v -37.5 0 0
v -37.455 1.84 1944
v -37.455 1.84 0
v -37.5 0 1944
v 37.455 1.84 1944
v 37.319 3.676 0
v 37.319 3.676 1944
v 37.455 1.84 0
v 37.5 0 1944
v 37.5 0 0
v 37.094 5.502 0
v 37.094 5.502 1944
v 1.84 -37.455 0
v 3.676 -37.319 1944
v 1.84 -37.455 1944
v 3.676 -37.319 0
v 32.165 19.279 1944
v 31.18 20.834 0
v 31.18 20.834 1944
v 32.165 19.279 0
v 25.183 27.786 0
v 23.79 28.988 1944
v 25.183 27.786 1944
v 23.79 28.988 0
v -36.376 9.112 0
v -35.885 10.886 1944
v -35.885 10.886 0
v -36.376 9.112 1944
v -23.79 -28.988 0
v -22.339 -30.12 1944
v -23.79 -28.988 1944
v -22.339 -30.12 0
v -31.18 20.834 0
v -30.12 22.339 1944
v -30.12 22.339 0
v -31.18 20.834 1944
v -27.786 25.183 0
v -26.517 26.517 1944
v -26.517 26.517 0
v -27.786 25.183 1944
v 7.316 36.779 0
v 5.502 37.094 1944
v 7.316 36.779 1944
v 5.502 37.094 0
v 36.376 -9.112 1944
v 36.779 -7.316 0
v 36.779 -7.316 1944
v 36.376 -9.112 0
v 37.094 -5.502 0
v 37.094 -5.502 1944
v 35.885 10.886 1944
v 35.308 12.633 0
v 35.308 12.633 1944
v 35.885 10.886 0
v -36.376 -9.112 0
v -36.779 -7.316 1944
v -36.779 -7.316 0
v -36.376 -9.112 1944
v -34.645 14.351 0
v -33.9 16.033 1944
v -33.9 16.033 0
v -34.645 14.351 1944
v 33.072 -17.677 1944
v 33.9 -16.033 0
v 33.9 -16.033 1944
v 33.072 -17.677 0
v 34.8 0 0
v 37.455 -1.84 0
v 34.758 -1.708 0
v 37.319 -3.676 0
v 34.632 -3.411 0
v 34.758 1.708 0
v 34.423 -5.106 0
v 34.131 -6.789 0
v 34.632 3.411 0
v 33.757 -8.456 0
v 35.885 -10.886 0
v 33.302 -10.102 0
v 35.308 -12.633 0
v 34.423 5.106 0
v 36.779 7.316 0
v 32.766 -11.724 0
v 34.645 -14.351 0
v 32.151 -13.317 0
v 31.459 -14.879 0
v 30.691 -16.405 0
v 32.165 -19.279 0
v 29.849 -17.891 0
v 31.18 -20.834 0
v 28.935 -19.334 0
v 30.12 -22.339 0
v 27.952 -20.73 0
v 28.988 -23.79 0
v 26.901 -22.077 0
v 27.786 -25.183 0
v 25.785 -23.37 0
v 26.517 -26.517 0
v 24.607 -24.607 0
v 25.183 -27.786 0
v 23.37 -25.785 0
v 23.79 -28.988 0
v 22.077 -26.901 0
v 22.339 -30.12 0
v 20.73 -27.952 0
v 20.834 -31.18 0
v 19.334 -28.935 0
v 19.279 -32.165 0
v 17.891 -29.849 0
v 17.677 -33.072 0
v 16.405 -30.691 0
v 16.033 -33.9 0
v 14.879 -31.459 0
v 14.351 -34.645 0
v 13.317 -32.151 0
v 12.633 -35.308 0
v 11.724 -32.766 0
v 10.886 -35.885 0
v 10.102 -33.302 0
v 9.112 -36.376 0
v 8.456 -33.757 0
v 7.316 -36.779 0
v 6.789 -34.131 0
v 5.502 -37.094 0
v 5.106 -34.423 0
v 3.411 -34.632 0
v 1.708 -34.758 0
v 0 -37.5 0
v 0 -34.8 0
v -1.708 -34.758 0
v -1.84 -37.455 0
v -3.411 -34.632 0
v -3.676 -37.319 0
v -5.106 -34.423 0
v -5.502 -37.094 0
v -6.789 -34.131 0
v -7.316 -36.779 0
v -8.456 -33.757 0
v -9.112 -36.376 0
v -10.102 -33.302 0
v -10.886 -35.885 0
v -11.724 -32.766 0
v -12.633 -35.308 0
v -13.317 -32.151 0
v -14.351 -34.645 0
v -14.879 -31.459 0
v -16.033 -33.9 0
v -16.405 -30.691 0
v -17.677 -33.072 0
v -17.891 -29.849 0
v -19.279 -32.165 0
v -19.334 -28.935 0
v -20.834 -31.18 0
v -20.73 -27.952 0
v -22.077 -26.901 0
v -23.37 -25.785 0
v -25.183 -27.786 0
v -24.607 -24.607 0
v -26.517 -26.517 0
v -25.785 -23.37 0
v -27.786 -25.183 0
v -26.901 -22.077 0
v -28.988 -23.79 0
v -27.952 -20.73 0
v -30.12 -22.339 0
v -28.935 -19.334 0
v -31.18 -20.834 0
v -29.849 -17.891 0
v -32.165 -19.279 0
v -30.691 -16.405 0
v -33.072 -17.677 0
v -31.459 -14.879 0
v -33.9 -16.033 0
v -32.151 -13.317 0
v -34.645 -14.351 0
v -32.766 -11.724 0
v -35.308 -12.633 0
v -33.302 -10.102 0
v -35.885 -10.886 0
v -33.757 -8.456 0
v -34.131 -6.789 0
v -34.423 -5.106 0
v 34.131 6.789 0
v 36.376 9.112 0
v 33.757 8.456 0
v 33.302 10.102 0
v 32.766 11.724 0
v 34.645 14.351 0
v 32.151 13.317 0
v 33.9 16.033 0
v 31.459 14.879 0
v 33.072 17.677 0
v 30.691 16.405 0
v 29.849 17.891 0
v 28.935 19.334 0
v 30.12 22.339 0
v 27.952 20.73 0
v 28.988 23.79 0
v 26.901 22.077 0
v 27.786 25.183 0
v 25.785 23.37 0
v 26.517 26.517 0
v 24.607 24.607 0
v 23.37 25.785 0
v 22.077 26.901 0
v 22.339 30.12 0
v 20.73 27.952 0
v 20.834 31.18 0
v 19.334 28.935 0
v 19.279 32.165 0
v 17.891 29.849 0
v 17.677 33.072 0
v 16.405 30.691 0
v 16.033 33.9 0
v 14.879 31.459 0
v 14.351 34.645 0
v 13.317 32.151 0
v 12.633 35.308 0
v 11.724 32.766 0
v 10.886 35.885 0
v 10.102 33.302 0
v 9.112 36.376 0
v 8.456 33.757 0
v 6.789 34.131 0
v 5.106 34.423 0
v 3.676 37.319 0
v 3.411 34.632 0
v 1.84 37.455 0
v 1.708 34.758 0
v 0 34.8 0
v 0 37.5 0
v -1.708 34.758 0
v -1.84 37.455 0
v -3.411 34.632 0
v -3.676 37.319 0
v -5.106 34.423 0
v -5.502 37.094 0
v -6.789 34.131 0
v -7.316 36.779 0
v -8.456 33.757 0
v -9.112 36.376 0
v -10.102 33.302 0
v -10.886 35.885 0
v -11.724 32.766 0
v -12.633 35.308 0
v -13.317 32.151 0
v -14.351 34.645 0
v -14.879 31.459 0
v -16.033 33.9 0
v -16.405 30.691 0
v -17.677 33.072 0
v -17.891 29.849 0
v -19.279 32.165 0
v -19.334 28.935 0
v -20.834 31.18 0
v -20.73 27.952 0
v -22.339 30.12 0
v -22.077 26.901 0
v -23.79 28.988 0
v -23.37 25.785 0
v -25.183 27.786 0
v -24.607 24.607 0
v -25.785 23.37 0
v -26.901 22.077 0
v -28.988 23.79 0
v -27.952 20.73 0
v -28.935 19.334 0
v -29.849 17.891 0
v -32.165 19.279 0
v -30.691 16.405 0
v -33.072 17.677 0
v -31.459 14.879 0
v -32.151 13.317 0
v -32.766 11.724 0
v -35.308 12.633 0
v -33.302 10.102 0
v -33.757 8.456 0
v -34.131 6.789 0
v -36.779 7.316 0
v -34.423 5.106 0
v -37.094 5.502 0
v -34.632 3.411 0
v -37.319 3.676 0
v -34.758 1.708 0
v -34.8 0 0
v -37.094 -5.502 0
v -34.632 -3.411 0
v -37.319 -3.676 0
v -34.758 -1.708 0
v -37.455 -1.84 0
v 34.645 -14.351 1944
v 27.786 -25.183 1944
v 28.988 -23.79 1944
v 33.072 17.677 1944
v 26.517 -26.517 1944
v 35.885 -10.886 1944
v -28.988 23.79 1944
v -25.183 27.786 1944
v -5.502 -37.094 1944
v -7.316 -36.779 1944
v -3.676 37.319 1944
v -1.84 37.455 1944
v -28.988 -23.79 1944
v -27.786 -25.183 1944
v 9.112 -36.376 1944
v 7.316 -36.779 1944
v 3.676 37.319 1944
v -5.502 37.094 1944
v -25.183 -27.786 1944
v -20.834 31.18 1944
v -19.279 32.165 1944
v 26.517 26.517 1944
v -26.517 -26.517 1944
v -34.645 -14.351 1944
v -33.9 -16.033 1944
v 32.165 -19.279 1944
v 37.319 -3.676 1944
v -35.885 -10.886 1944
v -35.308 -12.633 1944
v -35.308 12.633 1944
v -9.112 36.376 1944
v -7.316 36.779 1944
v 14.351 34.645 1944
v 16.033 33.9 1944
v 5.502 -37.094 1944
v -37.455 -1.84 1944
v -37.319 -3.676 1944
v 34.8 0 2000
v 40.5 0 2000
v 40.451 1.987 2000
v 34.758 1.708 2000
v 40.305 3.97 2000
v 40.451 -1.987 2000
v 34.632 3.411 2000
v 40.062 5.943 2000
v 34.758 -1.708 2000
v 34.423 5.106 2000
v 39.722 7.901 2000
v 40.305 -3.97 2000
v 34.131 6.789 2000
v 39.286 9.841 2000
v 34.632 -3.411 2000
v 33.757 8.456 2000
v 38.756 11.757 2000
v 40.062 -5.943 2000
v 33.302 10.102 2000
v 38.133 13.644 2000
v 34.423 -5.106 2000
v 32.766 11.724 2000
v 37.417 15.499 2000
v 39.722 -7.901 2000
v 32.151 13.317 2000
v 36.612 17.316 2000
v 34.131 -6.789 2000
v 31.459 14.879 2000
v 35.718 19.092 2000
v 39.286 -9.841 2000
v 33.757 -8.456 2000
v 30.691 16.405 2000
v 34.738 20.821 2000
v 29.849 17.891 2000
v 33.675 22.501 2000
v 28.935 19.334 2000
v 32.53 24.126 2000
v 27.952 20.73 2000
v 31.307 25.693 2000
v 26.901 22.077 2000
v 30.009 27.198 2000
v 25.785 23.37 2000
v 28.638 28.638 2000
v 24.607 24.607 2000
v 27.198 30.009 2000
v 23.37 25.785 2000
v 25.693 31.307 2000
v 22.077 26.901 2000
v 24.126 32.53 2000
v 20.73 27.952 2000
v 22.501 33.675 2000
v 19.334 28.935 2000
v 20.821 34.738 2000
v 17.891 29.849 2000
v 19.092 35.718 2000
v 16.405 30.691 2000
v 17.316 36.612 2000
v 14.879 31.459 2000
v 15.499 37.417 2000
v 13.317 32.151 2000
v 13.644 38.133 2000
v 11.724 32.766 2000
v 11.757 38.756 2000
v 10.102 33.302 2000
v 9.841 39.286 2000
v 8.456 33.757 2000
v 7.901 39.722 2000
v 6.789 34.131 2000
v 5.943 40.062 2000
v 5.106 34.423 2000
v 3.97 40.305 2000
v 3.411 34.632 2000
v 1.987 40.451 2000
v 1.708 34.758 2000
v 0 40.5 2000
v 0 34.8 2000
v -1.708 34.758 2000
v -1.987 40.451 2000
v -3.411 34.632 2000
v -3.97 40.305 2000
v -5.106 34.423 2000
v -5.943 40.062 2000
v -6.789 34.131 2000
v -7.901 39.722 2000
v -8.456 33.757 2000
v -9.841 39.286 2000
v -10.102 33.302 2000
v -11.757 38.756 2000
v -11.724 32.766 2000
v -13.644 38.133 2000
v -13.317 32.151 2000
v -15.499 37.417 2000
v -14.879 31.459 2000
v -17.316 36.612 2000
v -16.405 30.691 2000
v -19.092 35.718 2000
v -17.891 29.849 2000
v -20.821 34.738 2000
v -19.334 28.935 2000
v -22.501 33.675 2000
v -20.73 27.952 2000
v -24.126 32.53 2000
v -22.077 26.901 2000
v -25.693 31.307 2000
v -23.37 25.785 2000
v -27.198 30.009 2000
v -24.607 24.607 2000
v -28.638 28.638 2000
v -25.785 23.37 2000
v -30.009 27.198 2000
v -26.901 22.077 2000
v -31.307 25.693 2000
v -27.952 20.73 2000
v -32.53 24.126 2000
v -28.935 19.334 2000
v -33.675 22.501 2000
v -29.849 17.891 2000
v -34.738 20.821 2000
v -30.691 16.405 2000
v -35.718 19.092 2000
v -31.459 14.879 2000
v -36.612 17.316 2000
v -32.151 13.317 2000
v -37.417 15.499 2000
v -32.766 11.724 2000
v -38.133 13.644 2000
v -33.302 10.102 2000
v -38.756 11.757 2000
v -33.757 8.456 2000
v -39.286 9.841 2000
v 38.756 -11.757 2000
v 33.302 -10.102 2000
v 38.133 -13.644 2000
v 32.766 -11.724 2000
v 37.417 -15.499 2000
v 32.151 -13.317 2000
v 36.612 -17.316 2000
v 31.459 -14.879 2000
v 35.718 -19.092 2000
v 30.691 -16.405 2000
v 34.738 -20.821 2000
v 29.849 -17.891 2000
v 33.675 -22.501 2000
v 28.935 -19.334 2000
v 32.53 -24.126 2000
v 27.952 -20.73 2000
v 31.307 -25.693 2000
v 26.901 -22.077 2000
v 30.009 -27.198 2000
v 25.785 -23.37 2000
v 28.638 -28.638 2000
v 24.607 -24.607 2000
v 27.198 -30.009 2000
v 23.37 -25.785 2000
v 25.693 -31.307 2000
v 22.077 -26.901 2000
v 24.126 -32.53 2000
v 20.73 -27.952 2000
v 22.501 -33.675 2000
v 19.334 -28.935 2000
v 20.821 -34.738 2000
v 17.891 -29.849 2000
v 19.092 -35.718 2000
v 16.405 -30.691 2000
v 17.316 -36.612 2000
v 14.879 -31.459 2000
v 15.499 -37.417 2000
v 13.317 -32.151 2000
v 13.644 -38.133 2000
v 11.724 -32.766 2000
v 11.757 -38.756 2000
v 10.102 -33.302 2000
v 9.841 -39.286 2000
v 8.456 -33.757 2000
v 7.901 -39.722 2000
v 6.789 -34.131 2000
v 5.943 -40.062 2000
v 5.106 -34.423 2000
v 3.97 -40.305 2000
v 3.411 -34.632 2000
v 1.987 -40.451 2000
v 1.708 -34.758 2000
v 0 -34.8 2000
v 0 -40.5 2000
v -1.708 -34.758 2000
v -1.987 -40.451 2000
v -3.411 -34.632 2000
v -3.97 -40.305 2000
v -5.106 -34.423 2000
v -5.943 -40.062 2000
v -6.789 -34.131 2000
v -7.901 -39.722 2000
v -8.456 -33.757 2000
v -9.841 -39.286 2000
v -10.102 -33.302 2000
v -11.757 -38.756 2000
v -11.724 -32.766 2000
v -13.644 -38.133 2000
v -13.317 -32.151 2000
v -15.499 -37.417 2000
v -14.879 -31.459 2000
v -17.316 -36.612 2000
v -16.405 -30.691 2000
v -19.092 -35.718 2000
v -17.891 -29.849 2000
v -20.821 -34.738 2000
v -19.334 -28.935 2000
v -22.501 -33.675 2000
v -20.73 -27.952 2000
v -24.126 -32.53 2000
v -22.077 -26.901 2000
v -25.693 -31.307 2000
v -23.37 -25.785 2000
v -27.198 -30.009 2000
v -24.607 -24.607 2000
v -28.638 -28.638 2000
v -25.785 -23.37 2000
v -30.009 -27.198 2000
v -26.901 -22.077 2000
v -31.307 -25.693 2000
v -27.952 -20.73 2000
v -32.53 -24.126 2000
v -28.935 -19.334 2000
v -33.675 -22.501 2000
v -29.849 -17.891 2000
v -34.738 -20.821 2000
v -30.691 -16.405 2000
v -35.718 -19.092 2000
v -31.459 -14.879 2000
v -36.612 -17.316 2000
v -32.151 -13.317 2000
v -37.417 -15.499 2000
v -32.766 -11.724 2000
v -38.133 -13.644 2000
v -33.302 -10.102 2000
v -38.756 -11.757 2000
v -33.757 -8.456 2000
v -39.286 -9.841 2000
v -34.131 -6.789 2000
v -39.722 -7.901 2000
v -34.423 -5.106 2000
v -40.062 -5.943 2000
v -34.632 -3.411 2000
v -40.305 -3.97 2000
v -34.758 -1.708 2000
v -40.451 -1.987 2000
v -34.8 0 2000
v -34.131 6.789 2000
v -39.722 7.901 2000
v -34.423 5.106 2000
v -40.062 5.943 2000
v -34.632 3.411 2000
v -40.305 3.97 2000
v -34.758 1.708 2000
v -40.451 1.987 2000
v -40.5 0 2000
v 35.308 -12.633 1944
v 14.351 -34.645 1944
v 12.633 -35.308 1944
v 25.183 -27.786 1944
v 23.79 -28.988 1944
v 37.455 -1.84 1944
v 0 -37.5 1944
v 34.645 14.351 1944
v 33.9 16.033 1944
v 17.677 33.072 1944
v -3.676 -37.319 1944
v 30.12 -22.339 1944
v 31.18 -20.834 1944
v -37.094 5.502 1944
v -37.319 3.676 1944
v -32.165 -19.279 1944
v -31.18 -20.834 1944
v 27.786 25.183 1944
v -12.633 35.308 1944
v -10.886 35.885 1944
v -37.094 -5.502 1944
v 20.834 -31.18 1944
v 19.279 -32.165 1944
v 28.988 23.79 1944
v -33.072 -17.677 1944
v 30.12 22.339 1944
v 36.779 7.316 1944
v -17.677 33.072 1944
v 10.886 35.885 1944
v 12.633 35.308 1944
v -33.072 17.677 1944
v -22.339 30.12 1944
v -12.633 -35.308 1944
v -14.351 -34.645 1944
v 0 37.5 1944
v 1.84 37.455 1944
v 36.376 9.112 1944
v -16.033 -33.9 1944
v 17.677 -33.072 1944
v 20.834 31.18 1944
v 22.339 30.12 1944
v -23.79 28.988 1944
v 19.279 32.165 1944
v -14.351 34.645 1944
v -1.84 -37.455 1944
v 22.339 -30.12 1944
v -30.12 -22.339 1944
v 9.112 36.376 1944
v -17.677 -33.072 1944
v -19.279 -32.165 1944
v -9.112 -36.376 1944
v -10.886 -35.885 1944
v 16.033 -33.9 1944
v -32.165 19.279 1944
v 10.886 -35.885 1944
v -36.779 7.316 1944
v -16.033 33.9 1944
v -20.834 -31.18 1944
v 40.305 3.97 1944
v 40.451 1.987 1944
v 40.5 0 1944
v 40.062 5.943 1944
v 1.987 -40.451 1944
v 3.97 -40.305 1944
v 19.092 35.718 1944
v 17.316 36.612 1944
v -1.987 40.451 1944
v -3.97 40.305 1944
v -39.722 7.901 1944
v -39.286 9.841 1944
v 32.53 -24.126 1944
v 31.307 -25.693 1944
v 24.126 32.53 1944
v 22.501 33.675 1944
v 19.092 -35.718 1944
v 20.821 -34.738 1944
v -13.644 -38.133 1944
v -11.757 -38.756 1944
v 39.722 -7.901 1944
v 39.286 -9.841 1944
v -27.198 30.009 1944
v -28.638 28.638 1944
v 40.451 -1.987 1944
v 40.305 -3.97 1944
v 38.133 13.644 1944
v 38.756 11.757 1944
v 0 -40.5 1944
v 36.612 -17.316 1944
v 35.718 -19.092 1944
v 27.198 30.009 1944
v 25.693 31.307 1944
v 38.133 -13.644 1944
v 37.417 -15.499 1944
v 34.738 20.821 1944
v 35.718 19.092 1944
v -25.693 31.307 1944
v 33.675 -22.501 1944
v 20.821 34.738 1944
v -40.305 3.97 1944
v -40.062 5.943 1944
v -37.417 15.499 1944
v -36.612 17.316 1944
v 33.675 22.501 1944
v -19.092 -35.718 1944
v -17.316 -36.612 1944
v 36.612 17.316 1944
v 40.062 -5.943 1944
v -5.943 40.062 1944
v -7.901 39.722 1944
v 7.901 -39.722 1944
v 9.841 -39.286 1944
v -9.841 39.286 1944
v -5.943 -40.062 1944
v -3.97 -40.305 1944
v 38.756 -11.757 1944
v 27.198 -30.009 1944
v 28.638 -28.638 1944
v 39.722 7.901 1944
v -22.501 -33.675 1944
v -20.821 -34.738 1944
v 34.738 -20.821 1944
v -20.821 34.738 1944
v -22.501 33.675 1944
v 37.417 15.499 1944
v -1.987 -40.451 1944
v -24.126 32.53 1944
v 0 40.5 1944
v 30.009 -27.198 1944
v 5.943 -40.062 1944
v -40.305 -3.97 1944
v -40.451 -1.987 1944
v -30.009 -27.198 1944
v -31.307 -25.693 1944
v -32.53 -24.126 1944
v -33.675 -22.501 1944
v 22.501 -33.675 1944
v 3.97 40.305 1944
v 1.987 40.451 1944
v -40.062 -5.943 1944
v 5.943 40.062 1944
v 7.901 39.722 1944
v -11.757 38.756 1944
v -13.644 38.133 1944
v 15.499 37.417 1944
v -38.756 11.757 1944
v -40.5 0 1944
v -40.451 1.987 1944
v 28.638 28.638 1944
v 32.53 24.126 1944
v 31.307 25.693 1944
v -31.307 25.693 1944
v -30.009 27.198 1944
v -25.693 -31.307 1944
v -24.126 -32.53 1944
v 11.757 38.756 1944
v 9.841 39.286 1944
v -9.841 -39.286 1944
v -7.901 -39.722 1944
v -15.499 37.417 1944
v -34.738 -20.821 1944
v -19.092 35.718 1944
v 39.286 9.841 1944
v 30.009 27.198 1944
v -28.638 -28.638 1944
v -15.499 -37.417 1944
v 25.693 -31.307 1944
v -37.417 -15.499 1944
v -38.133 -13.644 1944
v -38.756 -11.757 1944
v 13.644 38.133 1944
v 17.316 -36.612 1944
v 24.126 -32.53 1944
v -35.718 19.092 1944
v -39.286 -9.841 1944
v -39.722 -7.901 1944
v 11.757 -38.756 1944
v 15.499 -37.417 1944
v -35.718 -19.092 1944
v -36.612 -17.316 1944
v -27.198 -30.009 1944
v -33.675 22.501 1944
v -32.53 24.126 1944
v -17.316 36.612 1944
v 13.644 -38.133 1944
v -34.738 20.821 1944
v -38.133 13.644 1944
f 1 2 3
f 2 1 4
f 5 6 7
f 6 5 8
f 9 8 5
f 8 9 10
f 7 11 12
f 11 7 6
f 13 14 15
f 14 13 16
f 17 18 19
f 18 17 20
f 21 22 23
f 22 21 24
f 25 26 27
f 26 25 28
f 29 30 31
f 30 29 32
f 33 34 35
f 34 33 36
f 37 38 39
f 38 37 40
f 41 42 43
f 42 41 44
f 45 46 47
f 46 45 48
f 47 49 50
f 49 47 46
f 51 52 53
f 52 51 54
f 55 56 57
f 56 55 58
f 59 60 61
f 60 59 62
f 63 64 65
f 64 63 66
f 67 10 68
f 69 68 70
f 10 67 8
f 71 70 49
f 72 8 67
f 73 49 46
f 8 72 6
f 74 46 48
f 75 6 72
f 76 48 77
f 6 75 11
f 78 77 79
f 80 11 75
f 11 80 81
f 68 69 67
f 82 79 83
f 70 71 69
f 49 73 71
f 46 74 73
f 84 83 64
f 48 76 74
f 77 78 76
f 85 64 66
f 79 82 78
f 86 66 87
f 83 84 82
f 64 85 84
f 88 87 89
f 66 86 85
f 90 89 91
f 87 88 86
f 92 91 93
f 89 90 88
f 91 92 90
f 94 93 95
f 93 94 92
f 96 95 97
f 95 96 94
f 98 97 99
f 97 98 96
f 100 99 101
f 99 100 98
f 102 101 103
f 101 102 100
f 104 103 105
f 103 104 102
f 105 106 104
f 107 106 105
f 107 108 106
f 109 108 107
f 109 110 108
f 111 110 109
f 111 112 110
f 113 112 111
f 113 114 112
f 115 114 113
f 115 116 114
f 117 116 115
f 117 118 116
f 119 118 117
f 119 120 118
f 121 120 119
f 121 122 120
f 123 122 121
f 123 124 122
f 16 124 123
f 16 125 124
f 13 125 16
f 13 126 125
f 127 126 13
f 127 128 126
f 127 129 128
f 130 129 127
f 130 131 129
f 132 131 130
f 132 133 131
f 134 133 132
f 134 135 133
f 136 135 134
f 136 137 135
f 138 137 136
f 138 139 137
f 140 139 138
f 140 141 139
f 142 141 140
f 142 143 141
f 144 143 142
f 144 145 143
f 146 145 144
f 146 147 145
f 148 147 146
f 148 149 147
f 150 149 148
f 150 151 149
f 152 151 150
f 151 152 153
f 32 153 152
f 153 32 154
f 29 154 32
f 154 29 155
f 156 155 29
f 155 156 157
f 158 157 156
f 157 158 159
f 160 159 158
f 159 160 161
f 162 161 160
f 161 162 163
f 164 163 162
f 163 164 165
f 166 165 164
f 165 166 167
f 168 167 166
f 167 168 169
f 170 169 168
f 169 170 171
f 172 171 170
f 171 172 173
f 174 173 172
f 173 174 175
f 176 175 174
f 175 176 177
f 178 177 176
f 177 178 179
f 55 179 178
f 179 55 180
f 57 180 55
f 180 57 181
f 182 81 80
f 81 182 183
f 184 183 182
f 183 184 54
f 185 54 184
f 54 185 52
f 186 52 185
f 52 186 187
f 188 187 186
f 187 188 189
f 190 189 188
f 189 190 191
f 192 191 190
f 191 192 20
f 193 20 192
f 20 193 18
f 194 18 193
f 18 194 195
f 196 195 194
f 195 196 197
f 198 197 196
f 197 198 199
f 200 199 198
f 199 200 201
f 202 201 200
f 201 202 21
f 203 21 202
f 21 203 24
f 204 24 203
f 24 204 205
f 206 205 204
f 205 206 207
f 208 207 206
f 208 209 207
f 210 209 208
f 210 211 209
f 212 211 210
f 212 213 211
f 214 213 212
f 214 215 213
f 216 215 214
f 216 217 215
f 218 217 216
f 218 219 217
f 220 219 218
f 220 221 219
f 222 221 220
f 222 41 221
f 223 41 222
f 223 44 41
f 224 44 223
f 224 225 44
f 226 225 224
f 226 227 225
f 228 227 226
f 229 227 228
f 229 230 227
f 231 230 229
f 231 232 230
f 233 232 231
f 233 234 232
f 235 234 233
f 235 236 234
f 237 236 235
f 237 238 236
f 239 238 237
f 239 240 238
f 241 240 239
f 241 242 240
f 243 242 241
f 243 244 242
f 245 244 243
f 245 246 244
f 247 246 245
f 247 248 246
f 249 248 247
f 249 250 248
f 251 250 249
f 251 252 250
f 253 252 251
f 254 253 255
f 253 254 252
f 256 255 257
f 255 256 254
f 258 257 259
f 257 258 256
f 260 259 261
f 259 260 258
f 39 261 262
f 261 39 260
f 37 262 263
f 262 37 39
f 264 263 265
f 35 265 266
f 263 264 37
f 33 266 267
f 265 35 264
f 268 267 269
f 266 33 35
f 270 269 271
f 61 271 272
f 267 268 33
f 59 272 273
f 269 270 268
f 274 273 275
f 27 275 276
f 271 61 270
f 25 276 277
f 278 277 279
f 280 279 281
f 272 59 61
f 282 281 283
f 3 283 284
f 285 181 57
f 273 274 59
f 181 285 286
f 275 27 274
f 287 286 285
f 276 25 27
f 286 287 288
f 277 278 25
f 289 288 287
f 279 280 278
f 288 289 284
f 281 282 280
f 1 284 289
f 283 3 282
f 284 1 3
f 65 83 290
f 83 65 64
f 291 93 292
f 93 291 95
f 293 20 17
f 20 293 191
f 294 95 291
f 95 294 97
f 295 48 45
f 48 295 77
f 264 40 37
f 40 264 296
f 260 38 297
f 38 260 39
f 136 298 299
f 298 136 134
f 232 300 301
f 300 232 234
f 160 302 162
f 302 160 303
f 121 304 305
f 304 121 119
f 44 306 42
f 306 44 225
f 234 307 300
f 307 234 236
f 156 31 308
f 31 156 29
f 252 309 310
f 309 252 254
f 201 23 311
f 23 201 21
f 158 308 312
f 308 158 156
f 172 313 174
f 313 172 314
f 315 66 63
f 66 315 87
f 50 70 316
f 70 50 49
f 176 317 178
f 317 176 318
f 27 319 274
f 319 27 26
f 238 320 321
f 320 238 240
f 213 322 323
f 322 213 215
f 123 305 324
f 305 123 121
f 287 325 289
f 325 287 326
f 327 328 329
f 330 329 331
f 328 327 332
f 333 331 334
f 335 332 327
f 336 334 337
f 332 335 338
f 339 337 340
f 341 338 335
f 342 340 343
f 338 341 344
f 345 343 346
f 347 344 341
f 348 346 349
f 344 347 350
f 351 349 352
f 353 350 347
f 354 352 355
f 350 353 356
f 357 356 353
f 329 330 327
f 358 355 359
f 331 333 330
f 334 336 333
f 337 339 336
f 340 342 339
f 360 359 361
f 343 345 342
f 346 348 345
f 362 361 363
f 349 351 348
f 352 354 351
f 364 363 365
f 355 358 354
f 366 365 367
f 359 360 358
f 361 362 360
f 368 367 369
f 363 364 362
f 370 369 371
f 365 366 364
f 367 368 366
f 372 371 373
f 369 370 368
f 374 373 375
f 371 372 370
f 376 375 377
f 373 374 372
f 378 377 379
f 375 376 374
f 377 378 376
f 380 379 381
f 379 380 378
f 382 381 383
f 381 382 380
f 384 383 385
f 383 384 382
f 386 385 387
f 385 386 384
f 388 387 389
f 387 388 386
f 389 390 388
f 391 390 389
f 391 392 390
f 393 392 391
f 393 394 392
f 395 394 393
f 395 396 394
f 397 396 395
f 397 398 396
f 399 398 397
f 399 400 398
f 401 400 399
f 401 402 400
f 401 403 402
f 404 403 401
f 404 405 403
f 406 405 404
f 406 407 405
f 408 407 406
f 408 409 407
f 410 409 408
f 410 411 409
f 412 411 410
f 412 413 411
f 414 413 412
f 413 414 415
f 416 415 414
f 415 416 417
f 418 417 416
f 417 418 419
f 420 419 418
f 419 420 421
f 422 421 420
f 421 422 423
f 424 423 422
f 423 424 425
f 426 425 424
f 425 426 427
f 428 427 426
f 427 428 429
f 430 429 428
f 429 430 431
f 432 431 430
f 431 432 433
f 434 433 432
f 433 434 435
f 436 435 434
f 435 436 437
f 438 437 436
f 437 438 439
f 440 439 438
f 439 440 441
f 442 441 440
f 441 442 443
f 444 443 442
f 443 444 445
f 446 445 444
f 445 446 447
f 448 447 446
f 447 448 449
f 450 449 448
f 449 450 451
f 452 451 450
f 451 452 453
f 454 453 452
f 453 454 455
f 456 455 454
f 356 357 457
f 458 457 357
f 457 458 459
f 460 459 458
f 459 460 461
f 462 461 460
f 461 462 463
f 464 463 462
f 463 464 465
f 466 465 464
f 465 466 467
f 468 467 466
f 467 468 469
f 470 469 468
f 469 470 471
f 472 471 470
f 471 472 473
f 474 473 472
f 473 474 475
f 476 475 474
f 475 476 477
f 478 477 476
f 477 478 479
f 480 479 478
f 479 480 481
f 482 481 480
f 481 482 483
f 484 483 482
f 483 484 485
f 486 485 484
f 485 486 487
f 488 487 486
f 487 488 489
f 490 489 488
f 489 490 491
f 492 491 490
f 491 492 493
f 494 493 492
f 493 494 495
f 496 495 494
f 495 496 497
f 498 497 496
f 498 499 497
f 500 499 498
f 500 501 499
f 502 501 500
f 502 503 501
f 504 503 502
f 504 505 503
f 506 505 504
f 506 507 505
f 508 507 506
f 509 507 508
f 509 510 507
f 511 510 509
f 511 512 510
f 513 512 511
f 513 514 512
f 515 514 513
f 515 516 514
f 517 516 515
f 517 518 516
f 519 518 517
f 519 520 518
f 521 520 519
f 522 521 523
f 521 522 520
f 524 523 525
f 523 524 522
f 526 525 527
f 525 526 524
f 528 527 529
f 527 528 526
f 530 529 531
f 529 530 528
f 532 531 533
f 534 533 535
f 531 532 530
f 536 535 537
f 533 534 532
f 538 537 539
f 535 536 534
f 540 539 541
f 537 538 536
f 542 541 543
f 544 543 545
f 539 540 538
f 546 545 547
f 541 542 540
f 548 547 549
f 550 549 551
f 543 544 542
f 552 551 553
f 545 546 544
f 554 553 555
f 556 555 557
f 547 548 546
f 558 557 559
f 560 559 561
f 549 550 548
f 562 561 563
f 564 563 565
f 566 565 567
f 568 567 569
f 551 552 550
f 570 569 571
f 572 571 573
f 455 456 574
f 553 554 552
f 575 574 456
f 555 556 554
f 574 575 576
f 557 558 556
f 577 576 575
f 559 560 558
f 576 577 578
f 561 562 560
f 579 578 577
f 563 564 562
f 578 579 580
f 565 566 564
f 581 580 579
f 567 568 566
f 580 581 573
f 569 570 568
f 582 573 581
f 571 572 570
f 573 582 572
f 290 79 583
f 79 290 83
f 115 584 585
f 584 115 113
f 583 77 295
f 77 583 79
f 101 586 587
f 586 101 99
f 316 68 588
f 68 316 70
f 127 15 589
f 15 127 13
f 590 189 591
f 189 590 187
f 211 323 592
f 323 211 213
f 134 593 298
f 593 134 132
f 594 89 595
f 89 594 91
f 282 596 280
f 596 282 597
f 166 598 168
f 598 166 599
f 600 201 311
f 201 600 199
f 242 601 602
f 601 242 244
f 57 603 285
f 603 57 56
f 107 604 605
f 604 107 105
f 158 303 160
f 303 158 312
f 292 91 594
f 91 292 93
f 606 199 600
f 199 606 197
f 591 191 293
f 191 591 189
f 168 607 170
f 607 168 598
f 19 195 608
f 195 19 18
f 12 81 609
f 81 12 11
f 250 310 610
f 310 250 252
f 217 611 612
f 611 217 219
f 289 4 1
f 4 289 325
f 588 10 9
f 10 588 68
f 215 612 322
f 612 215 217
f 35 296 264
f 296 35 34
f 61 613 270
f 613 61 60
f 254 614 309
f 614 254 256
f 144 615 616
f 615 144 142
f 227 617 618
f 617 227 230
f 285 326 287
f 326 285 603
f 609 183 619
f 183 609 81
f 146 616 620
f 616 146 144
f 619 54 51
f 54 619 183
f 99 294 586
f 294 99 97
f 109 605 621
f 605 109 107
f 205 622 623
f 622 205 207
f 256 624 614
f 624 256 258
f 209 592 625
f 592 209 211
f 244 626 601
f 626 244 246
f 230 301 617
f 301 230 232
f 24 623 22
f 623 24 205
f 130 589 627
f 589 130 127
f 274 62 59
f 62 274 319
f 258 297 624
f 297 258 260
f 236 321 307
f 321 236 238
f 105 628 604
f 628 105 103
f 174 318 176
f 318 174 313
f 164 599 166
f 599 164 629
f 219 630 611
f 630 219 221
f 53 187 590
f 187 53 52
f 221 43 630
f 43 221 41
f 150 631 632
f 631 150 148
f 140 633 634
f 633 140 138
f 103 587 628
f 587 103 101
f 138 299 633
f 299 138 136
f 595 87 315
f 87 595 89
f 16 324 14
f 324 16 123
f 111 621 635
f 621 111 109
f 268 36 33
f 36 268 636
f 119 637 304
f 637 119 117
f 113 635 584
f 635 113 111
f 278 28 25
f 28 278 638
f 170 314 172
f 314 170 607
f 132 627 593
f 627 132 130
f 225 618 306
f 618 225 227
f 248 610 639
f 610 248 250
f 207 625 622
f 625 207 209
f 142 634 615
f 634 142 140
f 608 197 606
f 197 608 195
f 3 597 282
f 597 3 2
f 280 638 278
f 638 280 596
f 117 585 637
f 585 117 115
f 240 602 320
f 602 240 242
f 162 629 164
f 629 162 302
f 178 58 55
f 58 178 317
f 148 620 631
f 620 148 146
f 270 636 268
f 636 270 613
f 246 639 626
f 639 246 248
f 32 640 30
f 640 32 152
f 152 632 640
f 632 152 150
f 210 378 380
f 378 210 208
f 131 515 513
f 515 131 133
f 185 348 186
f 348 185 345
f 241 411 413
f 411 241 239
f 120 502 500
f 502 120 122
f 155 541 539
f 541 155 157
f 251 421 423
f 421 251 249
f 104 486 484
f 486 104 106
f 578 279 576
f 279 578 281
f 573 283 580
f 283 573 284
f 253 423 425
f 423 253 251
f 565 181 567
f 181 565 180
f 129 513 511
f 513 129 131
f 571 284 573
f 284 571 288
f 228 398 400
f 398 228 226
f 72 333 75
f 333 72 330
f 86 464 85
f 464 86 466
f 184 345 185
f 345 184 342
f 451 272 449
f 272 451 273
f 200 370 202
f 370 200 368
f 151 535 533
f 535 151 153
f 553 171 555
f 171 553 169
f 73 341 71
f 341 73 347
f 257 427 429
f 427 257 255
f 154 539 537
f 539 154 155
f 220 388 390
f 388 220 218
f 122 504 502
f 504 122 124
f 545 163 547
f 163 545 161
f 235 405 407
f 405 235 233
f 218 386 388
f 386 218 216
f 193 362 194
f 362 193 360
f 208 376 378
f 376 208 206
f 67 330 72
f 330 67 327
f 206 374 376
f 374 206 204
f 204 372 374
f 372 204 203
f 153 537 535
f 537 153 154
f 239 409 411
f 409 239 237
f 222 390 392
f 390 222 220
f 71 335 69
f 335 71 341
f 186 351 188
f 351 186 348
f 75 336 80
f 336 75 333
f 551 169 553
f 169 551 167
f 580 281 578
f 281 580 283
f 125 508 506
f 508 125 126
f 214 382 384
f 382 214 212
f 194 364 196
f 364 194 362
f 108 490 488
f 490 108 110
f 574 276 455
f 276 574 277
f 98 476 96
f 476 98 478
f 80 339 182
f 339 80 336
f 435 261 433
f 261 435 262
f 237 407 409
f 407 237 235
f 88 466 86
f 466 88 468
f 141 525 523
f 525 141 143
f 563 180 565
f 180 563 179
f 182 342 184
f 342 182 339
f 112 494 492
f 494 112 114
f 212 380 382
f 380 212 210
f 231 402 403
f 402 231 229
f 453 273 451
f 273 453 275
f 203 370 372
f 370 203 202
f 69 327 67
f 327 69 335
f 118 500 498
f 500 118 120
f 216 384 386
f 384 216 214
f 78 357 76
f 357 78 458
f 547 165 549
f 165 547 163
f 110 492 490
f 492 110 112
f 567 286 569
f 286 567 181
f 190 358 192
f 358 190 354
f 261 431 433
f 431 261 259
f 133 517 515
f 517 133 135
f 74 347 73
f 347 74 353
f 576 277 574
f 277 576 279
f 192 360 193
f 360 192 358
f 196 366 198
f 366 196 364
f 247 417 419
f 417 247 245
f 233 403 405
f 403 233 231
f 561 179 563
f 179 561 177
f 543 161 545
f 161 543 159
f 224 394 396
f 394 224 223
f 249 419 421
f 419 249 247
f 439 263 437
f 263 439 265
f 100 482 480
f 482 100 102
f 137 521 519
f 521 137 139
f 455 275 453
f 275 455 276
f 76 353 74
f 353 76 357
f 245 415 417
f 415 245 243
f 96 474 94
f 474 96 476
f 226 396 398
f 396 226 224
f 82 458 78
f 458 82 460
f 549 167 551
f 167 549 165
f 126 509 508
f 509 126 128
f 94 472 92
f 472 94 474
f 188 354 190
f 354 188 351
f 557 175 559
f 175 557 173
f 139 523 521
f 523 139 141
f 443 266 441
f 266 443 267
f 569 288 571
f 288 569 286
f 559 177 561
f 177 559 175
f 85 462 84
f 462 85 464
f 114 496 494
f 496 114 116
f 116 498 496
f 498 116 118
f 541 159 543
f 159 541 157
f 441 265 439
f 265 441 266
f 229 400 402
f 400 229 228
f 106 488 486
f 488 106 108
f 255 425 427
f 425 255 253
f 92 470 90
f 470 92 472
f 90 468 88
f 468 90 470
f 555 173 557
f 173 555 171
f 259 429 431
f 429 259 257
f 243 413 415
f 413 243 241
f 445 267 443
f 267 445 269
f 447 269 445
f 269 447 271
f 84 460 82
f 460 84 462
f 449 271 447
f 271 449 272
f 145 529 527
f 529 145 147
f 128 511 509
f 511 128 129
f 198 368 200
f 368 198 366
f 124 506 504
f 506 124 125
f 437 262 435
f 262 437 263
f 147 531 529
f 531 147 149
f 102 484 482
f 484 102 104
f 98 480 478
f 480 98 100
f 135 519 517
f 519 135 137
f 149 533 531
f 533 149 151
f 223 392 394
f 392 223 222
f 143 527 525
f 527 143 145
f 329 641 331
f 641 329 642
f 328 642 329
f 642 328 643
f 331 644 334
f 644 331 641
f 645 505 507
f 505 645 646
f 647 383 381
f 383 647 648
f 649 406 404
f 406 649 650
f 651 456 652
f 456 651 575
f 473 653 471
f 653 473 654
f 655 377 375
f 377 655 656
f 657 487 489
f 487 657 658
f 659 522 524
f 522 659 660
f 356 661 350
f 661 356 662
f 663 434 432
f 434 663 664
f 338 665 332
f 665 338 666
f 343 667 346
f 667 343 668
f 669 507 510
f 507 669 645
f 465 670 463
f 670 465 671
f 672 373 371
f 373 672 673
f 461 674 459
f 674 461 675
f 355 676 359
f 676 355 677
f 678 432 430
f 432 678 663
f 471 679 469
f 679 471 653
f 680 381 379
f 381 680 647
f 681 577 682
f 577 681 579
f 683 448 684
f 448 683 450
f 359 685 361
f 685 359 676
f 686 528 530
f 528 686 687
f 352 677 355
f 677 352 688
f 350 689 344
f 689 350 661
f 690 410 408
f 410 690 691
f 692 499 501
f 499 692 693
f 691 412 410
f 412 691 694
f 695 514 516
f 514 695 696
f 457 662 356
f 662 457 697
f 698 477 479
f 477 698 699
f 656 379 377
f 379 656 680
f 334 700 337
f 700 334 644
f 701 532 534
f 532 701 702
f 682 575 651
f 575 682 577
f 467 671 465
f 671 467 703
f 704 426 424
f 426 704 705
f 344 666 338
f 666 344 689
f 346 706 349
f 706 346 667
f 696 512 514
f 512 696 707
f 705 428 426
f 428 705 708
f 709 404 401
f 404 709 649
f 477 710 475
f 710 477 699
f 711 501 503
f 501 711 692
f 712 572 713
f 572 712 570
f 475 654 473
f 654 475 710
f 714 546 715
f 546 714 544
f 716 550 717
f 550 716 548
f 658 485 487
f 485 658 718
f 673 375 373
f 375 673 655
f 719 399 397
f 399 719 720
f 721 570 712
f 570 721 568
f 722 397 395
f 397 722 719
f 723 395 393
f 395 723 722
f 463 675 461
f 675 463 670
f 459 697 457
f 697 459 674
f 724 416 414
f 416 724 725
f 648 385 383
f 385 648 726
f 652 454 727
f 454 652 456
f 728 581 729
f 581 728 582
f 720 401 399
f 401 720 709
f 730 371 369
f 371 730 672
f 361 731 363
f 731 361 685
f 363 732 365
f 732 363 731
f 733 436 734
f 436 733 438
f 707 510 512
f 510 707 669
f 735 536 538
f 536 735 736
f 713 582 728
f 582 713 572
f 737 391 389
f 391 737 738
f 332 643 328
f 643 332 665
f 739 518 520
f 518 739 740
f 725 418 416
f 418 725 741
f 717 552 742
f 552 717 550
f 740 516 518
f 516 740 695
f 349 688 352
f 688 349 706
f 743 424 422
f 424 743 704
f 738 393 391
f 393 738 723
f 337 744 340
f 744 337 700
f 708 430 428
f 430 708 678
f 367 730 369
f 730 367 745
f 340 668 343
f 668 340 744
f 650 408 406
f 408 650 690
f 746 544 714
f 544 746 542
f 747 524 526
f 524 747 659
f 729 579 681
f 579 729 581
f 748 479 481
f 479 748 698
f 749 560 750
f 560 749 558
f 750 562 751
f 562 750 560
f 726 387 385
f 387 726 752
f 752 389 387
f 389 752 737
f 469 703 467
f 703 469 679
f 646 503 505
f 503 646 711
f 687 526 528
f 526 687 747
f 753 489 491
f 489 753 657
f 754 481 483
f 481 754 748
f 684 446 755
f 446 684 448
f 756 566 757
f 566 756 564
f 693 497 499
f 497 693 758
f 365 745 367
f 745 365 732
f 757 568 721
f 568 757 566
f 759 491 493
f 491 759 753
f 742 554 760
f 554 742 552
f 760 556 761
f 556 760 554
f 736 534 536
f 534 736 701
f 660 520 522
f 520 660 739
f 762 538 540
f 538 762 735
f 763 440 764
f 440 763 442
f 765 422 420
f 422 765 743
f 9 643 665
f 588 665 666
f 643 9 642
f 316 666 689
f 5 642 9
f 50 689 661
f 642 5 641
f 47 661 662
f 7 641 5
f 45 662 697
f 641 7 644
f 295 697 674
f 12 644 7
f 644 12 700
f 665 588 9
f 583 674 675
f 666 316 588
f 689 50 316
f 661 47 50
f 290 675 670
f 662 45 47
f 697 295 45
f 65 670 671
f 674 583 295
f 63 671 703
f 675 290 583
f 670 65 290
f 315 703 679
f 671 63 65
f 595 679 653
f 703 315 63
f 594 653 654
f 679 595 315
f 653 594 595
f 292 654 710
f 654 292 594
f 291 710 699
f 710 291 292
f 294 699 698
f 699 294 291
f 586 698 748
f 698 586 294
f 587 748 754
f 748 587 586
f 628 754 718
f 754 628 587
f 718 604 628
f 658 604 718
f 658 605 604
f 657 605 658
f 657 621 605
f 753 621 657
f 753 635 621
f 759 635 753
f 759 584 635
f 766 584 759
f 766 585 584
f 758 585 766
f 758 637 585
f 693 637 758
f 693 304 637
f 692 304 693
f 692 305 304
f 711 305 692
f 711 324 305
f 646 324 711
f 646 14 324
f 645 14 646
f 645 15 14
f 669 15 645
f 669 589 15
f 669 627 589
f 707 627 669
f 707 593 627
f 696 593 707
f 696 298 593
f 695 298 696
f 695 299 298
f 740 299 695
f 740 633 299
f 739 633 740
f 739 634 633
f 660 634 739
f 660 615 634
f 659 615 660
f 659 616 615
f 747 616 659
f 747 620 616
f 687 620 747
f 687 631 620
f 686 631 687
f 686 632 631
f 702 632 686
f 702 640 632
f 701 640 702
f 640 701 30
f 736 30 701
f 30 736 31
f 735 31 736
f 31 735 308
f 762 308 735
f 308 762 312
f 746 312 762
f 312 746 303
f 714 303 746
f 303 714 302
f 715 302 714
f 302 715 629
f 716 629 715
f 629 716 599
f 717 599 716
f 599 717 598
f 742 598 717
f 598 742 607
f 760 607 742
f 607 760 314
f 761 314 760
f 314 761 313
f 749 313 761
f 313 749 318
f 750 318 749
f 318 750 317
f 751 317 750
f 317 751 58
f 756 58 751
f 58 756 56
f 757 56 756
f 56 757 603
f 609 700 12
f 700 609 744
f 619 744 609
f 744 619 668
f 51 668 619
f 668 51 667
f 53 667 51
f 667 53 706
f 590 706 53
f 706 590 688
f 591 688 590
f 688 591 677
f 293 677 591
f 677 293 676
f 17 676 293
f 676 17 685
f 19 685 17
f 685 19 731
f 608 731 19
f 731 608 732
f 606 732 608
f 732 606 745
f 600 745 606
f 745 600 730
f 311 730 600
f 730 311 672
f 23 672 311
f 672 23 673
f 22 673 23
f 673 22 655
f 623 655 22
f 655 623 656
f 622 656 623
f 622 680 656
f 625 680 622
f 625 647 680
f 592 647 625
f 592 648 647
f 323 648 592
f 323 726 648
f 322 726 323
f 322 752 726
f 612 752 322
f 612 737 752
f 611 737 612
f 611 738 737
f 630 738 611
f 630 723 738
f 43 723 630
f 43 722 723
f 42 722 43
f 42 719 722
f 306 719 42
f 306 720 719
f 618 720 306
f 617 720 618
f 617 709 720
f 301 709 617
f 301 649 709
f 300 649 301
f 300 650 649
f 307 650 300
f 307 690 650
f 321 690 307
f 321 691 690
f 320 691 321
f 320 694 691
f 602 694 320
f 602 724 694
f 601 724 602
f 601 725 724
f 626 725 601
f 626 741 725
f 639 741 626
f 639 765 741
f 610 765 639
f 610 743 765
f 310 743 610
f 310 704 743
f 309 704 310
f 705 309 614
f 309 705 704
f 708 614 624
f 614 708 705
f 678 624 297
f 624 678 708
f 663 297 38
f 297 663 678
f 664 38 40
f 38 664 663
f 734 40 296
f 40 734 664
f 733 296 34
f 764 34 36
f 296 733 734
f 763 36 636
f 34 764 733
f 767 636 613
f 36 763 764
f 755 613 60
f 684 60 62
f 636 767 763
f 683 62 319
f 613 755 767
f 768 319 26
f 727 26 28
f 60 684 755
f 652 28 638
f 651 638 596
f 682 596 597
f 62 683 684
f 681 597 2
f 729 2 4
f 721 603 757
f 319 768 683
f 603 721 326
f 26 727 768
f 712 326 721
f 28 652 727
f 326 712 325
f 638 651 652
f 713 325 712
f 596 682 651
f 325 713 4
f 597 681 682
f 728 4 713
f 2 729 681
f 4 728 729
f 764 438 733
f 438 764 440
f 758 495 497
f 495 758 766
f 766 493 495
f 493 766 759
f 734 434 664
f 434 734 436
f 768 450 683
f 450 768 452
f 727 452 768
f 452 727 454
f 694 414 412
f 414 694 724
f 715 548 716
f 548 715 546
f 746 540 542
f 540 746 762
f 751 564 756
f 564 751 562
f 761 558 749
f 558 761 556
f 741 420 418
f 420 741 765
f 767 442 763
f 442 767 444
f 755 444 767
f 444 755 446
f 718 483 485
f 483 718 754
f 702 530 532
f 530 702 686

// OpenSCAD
// Parameters
pipe_standard = 0; //[0:1:1]
nominal_diameter_mm = 75; //[40:150:1]
length_mm = 2000; //[1000:4000:10]
pipe_od_mm = 75; //[40:150:1]
pipe_wall_mm = 2.7; //[1.5:6:0.1]
fitting_length_mm = 55; //[30:120:1]
fitting_od_extra_mm = 6; //[2:20:0.5]
fitting_wall_extra_mm = 1.3; //[0.5:4:0.1]
socket_depth_mm = 40; //[20:90:1]
overlap_mm = 1; //[0.5:2:0.1]

$fn = 128;

// HT Pipe - one connected solid
module ht_pipe() {
    // Derived radii
    pipe_ro = pipe_od_mm/2;
    pipe_ri = max(0.01, pipe_ro - pipe_wall_mm);

    fit_ro  = pipe_ro + fitting_od_extra_mm/2;
    fit_wall = pipe_wall_mm + fitting_wall_extra_mm;
    fit_ri  = max(0.01, fit_ro - fit_wall);

    // Ensure socket depth doesn't exceed fitting length
    sock_d = min(socket_depth_mm, fitting_length_mm);

    // Place fitting so it overlaps the pipe by overlap_mm (guaranteed connection)
    fit_z0 = length_mm - fitting_length_mm - overlap_mm;

    color([0.85, 0.85, 0.8])
    union() {
        // Main pipe (hollow)
        difference() {
            cylinder(h=length_mm, r=pipe_ro, center=false);
            translate([0, 0, -0.01])
                cylinder(h=length_mm + 0.02, r=pipe_ri, center=false);
        }

        // Integrated socket/fitting (hollow, open at end)
        translate([0, 0, fit_z0])
        difference() {
            cylinder(h=fitting_length_mm + overlap_mm, r=fit_ro, center=false);

            // Inner void: full length to keep it a socket (open end),
            // with slight extension for robust boolean
            translate([0, 0, -0.01])
                cylinder(h=fitting_length_mm + overlap_mm + 0.02, r=fit_ri, center=false);
        }
    }
}

ht_pipe();
